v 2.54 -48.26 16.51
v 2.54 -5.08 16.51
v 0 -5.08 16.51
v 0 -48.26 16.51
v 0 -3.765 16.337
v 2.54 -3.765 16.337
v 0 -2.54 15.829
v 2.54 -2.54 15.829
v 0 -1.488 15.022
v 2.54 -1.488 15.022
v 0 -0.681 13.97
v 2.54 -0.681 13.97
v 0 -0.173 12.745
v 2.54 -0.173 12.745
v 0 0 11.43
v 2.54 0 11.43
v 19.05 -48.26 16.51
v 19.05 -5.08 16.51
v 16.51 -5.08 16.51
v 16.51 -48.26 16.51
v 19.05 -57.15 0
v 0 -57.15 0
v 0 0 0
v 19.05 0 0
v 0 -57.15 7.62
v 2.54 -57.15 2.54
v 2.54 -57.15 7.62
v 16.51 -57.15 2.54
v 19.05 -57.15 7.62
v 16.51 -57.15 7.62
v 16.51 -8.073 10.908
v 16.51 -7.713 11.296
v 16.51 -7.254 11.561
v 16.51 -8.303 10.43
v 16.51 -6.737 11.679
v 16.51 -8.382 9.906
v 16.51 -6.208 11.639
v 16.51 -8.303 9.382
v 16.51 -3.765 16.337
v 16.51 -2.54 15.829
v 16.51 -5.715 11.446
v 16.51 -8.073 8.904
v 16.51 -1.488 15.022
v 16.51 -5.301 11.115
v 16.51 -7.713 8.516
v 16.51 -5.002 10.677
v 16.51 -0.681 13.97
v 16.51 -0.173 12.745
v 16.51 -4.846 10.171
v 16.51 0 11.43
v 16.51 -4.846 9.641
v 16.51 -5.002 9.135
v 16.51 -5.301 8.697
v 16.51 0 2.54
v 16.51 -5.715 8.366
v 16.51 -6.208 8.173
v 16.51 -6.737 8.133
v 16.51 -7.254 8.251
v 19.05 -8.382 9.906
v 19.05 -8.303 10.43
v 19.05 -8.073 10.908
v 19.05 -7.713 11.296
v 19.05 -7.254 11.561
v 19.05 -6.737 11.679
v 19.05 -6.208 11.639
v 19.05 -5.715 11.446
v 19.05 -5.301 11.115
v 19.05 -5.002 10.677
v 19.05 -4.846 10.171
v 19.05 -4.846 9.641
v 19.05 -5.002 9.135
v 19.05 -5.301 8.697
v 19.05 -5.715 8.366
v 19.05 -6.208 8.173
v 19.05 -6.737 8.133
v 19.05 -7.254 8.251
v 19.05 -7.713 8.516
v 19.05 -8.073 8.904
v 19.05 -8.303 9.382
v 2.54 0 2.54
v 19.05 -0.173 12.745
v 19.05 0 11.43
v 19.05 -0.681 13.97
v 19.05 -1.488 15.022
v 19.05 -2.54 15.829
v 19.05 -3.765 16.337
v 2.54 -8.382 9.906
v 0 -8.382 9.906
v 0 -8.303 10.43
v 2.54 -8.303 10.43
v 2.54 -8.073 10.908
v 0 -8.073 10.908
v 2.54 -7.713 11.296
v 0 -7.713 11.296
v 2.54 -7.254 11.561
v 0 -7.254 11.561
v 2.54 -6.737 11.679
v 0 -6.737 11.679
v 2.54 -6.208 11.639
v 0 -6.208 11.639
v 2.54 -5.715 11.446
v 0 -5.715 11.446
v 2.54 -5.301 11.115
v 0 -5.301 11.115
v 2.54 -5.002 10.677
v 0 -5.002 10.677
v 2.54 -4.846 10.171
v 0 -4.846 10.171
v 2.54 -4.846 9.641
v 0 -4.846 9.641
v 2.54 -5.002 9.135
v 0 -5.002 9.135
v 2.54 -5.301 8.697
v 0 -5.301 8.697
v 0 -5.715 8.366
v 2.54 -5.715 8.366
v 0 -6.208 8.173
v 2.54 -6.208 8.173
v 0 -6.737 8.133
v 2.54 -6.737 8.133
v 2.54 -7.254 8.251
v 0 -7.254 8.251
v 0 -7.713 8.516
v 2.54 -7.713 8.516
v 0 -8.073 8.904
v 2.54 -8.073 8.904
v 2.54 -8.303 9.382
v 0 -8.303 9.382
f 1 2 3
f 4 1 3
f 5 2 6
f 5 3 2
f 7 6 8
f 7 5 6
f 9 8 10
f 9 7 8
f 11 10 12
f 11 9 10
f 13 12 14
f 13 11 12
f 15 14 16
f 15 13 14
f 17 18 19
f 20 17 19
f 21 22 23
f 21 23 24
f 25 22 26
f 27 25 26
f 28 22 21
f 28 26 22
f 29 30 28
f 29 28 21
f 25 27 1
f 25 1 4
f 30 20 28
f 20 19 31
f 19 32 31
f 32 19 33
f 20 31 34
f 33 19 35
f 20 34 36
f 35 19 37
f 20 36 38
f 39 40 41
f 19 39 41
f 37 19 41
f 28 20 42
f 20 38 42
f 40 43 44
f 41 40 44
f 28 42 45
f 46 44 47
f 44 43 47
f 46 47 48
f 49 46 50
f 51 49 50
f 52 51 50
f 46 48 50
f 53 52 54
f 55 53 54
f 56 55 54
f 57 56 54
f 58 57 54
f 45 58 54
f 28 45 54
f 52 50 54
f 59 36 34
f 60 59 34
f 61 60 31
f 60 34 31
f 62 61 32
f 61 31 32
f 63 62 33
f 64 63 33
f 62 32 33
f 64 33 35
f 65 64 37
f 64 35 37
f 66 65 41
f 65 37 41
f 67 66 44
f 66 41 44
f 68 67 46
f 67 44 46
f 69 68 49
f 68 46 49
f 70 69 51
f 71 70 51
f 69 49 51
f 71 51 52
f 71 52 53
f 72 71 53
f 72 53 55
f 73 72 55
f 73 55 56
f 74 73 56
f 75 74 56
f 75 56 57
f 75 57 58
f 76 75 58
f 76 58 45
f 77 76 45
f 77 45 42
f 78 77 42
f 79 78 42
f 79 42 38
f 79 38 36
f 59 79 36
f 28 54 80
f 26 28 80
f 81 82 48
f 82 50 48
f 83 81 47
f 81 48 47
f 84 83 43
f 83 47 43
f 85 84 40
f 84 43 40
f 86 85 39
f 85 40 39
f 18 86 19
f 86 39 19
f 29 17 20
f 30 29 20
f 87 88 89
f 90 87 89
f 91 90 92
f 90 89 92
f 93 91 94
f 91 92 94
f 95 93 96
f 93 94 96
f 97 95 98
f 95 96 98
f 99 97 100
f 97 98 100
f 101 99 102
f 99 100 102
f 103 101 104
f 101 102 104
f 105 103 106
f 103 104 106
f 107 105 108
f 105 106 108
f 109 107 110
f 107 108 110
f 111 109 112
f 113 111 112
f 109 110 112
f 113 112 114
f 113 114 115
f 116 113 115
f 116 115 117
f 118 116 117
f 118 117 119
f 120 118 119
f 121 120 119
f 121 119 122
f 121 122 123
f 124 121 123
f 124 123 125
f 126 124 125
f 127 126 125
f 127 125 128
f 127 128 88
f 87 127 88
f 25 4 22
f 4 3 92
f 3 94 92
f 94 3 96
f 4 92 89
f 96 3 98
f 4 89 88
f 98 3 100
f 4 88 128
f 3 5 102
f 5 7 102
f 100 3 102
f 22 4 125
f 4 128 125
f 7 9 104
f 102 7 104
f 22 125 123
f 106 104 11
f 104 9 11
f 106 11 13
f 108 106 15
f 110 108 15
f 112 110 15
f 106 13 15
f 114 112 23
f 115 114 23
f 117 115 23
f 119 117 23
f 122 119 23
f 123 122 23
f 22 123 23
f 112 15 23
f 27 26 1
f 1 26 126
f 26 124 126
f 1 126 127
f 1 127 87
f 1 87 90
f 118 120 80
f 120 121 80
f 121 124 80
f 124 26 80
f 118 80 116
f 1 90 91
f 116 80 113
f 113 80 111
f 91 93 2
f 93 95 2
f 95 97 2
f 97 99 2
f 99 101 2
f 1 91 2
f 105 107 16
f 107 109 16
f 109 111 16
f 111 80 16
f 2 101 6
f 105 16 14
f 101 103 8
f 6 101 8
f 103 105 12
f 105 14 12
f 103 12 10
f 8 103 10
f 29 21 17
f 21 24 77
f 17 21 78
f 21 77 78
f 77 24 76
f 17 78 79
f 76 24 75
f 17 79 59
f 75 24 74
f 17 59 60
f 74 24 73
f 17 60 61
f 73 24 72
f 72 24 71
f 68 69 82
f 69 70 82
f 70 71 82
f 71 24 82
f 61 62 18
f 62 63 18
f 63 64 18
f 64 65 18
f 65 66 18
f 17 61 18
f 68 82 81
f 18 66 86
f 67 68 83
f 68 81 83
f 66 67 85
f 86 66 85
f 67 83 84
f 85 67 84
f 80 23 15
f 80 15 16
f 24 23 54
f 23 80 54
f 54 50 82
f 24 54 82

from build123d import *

# Parameters (mm, degrees)
F1_DEPTH = 57.15
F2_R     = 1.778
F3_DEPTH = 19.051
F4_R     = 5.08
F5_SIZE  = 8.89


with BuildPart() as f1:
    # F0 (on Front) → F1 (new body)
    with BuildSketch(Plane.XZ):
        Polygon((0, 16.51), (0, 0), (19.05, 0), (19.05, 16.51), (16.51, 16.51), (16.51, 2.54), (2.54, 2.54), (2.54, 16.51), align=None)
    extrude(amount=F1_DEPTH)

    # F2 (on face) → F3 (cut, through all)
    with BuildSketch(Plane(origin=(0, 0, 0), x_dir=(0, -1, 0), z_dir=(-1, 0, 0))):
        with Locations((6.604, 9.906)):
            Circle(F2_R)
    extrude(amount=-F3_DEPTH, mode=Mode.SUBTRACT)

    # F4
    f4_edges = [f1.edges().sort_by_distance(p)[0] for p in [
        (17.78, 0, 16.51),
        (1.27, 0, 16.51),
    ]]
    fillet(f4_edges, radius=F4_R)

    # F5
    f5_edges = [f1.edges().sort_by_distance(p)[0] for p in [
        (1.27, -57.15, 16.51),
        (17.78, -57.15, 16.51),
    ]]
    chamfer(f5_edges, length=F5_SIZE)


solid = f1.part
